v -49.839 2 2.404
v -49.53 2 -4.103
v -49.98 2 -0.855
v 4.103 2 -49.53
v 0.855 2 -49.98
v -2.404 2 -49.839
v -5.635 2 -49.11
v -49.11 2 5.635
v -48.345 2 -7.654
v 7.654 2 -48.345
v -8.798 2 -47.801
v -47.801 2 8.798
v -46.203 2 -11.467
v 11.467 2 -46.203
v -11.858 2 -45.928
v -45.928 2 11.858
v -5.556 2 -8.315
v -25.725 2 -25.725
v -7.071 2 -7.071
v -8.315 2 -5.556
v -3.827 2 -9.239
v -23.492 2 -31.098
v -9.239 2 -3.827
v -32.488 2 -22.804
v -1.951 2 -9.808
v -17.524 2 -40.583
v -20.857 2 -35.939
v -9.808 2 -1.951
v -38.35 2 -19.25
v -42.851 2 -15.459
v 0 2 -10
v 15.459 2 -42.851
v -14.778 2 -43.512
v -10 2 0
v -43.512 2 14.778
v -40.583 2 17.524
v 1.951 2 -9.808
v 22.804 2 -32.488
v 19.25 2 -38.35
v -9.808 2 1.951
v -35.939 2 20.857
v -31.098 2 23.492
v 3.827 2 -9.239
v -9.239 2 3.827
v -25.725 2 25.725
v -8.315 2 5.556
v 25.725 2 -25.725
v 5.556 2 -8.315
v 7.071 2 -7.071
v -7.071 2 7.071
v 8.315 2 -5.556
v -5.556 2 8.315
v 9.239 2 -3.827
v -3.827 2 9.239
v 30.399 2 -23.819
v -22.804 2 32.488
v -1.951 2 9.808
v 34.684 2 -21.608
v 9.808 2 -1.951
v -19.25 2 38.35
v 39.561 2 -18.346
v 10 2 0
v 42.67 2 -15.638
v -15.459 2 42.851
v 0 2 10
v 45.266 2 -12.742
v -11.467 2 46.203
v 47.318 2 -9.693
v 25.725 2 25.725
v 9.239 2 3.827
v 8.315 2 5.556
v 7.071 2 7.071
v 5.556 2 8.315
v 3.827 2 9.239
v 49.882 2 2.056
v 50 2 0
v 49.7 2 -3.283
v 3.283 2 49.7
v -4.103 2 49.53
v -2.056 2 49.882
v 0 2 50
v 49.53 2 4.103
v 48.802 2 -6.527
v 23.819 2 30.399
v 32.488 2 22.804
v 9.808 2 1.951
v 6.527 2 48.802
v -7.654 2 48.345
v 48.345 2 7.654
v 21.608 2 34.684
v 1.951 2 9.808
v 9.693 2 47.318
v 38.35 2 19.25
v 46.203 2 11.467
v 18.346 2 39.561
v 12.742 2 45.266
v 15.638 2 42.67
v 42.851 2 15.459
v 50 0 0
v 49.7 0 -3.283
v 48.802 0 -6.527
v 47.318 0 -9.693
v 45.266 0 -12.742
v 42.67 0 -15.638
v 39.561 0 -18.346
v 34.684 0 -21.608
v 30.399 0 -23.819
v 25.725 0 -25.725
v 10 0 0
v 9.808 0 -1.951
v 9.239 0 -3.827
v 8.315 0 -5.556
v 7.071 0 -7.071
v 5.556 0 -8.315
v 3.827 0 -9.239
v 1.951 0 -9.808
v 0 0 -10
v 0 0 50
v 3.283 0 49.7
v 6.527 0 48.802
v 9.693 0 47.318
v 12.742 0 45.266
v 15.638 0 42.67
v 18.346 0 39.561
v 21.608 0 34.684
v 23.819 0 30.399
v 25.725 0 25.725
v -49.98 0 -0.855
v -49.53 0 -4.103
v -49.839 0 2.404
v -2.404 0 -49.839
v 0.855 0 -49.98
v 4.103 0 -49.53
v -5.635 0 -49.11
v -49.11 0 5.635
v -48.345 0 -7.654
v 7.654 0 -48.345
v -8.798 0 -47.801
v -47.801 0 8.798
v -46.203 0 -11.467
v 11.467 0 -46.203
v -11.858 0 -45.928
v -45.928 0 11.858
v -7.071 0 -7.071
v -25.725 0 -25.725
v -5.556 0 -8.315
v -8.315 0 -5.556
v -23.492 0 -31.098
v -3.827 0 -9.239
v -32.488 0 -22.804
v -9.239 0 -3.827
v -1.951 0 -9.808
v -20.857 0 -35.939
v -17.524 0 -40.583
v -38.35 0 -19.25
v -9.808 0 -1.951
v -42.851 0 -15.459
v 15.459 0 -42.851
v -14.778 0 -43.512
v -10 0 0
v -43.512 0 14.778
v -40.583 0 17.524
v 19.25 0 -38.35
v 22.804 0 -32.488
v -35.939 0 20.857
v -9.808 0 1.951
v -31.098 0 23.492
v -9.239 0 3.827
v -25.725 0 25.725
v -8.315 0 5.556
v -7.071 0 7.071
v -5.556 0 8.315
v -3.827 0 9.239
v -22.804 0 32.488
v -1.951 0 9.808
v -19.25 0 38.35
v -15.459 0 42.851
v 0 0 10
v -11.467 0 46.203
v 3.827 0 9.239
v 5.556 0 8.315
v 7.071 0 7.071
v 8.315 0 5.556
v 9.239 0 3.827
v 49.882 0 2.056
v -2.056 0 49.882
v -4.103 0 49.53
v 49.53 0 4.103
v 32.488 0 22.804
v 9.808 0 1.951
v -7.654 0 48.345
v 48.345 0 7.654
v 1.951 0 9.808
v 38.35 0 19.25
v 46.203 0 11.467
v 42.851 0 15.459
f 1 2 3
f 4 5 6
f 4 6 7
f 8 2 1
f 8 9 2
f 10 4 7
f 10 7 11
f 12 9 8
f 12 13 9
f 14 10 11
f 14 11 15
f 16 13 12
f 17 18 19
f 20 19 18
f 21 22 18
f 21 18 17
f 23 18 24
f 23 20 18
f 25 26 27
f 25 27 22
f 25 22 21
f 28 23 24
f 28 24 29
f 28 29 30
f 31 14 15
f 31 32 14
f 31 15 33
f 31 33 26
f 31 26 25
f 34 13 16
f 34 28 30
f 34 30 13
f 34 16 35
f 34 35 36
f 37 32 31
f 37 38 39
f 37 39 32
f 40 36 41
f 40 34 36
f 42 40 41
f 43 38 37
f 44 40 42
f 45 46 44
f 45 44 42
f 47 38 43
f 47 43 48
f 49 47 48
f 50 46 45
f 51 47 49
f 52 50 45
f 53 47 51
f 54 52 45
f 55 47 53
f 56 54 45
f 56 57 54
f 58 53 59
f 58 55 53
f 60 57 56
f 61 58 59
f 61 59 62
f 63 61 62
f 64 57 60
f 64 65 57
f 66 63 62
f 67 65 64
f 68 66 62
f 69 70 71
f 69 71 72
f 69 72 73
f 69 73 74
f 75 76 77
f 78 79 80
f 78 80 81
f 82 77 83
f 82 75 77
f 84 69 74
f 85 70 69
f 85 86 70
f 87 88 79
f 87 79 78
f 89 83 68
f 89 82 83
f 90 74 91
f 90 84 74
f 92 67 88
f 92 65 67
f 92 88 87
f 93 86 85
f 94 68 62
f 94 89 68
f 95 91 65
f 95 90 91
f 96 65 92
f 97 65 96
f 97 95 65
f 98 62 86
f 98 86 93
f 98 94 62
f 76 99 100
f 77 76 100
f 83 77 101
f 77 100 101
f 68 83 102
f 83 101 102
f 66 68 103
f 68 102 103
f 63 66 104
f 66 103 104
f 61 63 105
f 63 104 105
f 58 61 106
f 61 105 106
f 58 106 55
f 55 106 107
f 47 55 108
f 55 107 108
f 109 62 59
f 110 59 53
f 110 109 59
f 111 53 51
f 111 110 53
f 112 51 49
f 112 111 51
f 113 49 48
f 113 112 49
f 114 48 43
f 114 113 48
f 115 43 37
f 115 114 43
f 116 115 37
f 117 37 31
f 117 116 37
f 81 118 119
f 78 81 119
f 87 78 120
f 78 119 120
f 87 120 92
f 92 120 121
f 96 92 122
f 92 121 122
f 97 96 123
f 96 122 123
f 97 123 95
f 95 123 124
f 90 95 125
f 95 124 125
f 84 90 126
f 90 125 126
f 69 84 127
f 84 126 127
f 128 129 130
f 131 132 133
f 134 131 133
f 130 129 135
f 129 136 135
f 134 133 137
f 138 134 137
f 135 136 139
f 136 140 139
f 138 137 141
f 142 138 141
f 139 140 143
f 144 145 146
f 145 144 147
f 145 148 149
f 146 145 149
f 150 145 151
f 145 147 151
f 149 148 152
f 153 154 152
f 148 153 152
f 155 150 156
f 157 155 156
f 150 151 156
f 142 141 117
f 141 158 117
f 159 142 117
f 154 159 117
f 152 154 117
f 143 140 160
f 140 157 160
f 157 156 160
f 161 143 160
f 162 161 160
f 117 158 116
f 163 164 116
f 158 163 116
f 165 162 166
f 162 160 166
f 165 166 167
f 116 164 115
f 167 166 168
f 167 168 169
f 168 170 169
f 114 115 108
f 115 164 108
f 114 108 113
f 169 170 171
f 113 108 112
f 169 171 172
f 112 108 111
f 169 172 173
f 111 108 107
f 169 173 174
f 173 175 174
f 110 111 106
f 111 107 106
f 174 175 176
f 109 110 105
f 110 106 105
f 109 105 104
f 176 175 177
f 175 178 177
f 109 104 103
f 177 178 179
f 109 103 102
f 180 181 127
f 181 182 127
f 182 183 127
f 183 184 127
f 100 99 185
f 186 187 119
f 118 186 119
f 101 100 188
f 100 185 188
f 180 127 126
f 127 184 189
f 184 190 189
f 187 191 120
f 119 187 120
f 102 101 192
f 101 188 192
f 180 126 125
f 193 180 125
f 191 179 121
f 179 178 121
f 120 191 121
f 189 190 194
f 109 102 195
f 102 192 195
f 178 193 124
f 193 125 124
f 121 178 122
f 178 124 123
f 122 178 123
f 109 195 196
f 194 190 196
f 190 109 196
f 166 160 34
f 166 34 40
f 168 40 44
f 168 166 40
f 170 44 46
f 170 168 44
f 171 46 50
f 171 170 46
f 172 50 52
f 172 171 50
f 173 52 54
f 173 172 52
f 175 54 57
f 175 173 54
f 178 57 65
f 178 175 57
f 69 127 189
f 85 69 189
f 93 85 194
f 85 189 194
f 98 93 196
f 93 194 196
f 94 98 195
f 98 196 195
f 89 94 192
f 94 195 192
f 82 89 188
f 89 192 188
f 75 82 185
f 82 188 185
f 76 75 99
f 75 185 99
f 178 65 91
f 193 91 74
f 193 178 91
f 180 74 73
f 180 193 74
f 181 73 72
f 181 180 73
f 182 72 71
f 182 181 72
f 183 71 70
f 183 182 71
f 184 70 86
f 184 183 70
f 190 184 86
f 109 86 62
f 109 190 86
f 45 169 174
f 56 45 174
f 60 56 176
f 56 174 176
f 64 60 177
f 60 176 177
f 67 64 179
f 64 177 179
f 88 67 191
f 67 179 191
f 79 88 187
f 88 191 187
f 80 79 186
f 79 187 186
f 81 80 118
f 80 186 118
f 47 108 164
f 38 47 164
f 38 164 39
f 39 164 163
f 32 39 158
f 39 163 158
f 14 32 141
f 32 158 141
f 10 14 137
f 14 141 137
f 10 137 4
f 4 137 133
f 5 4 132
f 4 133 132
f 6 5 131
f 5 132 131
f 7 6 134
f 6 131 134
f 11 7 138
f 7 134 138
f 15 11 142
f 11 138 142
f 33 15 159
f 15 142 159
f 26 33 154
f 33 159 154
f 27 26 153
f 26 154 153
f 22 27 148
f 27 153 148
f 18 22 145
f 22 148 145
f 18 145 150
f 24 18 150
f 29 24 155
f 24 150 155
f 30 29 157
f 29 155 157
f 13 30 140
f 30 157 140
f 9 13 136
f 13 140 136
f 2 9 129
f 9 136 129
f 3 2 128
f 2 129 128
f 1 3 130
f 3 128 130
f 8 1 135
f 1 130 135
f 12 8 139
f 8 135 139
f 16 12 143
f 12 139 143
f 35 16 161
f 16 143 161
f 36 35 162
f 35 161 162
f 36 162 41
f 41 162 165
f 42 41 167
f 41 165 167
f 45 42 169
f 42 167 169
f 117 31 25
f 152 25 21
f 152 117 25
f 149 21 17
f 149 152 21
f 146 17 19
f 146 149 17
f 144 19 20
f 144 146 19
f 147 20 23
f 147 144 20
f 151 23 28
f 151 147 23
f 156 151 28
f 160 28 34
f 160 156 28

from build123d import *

# Parameters (mm, degrees)
SZKIC1_RX                   = 50
SZKIC1_RY                   = 30
DODANIE_WYCI_GNI_CIE1_DEPTH = 2
WYTNIJ_WYCI_GNI_CIE1_REACH  = 72.739


with BuildPart() as part:
    # Szkic1 → Dodanie-wyci_gni_cie1 (new body)
    with BuildSketch(Plane(origin=(0, 0, 0), x_dir=(1, 0, 0), z_dir=(0, 1, 0))):
        with Locations(Location((0, 0), (0, 0, -90))):
            Ellipse(SZKIC1_RX, SZKIC1_RY)
        with Locations((0, 0)):
            Ellipse(SZKIC1_RX, SZKIC1_RY)
    extrude(amount=DODANIE_WYCI_GNI_CIE1_DEPTH)

    # Szkic1_4 → Wytnij-wyci_gni_cie1 (cut, up to next)
    with BuildSketch(Plane(origin=(0, 0, 0), x_dir=(1, 0, 0), z_dir=(0, 1, 0)), mode=Mode.PRIVATE) as wytnij_wyci_gni_cie1_sk1:
        with BuildLine():
            ThreePointArc((0, 10), (-7.071067818, 7.071067805), (-10, -1.8e-08))
            Line((-10, 0), (0, 0))
            Line((0, 0), (0, 10))
        make_face()
    wytnij_wyci_gni_cie1_tool1 = extrude(wytnij_wyci_gni_cie1_sk1.sketch, amount=WYTNIJ_WYCI_GNI_CIE1_REACH, mode=Mode.PRIVATE) & part.part
    # Szkic1_4 → Wytnij-wyci_gni_cie1 (cut, up to next)
    with BuildSketch(Plane(origin=(0, 0, 0), x_dir=(1, 0, 0), z_dir=(0, 1, 0)), mode=Mode.PRIVATE) as wytnij_wyci_gni_cie1_sk2:
        with BuildLine():
            Line((0, 0), (-10, 0))
            ThreePointArc((-10, -1.8e-08), (-7.071067805, -7.071067818), (0, -10))
            Line((0, -10), (0, 0))
        make_face()
    wytnij_wyci_gni_cie1_tool2 = extrude(wytnij_wyci_gni_cie1_sk2.sketch, amount=WYTNIJ_WYCI_GNI_CIE1_REACH, mode=Mode.PRIVATE) & part.part
    # Szkic1_4 → Wytnij-wyci_gni_cie1 (cut, up to next)
    with BuildSketch(Plane(origin=(0, 0, 0), x_dir=(1, 0, 0), z_dir=(0, 1, 0)), mode=Mode.PRIVATE) as wytnij_wyci_gni_cie1_sk3:
        with BuildLine():
            ThreePointArc((10, 0), (7.071067812, 7.071067812), (0, 10))
            Line((0, 10), (0, 0))
            Line((0, 0), (10, 0))
        make_face()
    wytnij_wyci_gni_cie1_tool3 = extrude(wytnij_wyci_gni_cie1_sk3.sketch, amount=WYTNIJ_WYCI_GNI_CIE1_REACH, mode=Mode.PRIVATE) & part.part
    # Szkic1_4 → Wytnij-wyci_gni_cie1 (cut, up to next)
    with BuildSketch(Plane(origin=(0, 0, 0), x_dir=(1, 0, 0), z_dir=(0, 1, 0)), mode=Mode.PRIVATE) as wytnij_wyci_gni_cie1_sk4:
        with BuildLine():
            Line((10, 0), (0, 0))
            Line((0, 0), (0, -10))
            ThreePointArc((0, -10), (7.071067812, -7.071067812), (10, 0))
        make_face()
    wytnij_wyci_gni_cie1_tool4 = extrude(wytnij_wyci_gni_cie1_sk4.sketch, amount=WYTNIJ_WYCI_GNI_CIE1_REACH, mode=Mode.PRIVATE) & part.part
    # Szkic1_4 → Wytnij-wyci_gni_cie1 (cut, up to next)
    with BuildSketch(Plane(origin=(0, 0, 0), x_dir=(1, 0, 0), z_dir=(0, 1, 0)), mode=Mode.PRIVATE) as wytnij_wyci_gni_cie1_sk5:
        with BuildLine():
            ThreePointArc((0, 10), (-7.071067818, 7.071067805), (-10, -1.8e-08))
            Line((-10, 0), (0, 0))
            Line((0, 0), (0, 10))
        make_face()
    wytnij_wyci_gni_cie1_tool5 = extrude(wytnij_wyci_gni_cie1_sk5.sketch, amount=WYTNIJ_WYCI_GNI_CIE1_REACH, mode=Mode.PRIVATE) & part.part
    # Szkic1_4 → Wytnij-wyci_gni_cie1 (cut, up to next)
    with BuildSketch(Plane(origin=(0, 0, 0), x_dir=(1, 0, 0), z_dir=(0, 1, 0)), mode=Mode.PRIVATE) as wytnij_wyci_gni_cie1_sk6:
        with BuildLine():
            Line((0, 0), (-10, 0))
            ThreePointArc((-10, -1.8e-08), (-7.071067805, -7.071067818), (0, -10))
            Line((0, -10), (0, 0))
        make_face()
    wytnij_wyci_gni_cie1_tool6 = extrude(wytnij_wyci_gni_cie1_sk6.sketch, amount=WYTNIJ_WYCI_GNI_CIE1_REACH, mode=Mode.PRIVATE) & part.part
    # Szkic1_4 → Wytnij-wyci_gni_cie1 (cut, up to next)
    with BuildSketch(Plane(origin=(0, 0, 0), x_dir=(1, 0, 0), z_dir=(0, 1, 0)), mode=Mode.PRIVATE) as wytnij_wyci_gni_cie1_sk7:
        with BuildLine():
            ThreePointArc((10, 0), (7.071067812, 7.071067812), (0, 10))
            Line((0, 10), (0, 0))
            Line((0, 0), (10, 0))
        make_face()
    wytnij_wyci_gni_cie1_tool7 = extrude(wytnij_wyci_gni_cie1_sk7.sketch, amount=WYTNIJ_WYCI_GNI_CIE1_REACH, mode=Mode.PRIVATE) & part.part
    # Szkic1_4 → Wytnij-wyci_gni_cie1 (cut, up to next)
    with BuildSketch(Plane(origin=(0, 0, 0), x_dir=(1, 0, 0), z_dir=(0, 1, 0)), mode=Mode.PRIVATE) as wytnij_wyci_gni_cie1_sk8:
        with BuildLine():
            Line((10, 0), (0, 0))
            Line((0, 0), (0, -10))
            ThreePointArc((0, -10), (7.071067812, -7.071067812), (10, 0))
        make_face()
    wytnij_wyci_gni_cie1_tool8 = extrude(wytnij_wyci_gni_cie1_sk8.sketch, amount=WYTNIJ_WYCI_GNI_CIE1_REACH, mode=Mode.PRIVATE) & part.part
    # Szkic1_4 → Wytnij-wyci_gni_cie1 (cut, up to next)
    with BuildSketch(Plane(origin=(0, 0, 0), x_dir=(1, 0, 0), z_dir=(0, 1, 0)), mode=Mode.PRIVATE) as wytnij_wyci_gni_cie1_sk9:
        with BuildLine():
            ThreePointArc((0, 10), (-7.071067818, 7.071067805), (-10, -1.8e-08))
            Line((-10, 0), (0, 0))
            Line((0, 0), (0, 10))
        make_face()
    wytnij_wyci_gni_cie1_tool9 = extrude(wytnij_wyci_gni_cie1_sk9.sketch, amount=WYTNIJ_WYCI_GNI_CIE1_REACH, mode=Mode.PRIVATE) & part.part
    # Szkic1_4 → Wytnij-wyci_gni_cie1 (cut, up to next)
    with BuildSketch(Plane(origin=(0, 0, 0), x_dir=(1, 0, 0), z_dir=(0, 1, 0)), mode=Mode.PRIVATE) as wytnij_wyci_gni_cie1_sk10:
        with BuildLine():
            Line((0, 0), (-10, 0))
            ThreePointArc((-10, -1.8e-08), (-7.071067805, -7.071067818), (0, -10))
            Line((0, -10), (0, 0))
        make_face()
    wytnij_wyci_gni_cie1_tool10 = extrude(wytnij_wyci_gni_cie1_sk10.sketch, amount=WYTNIJ_WYCI_GNI_CIE1_REACH, mode=Mode.PRIVATE) & part.part
    # Szkic1_4 → Wytnij-wyci_gni_cie1 (cut, up to next)
    with BuildSketch(Plane(origin=(0, 0, 0), x_dir=(1, 0, 0), z_dir=(0, 1, 0)), mode=Mode.PRIVATE) as wytnij_wyci_gni_cie1_sk11:
        with BuildLine():
            ThreePointArc((10, 0), (7.071067812, 7.071067812), (0, 10))
            Line((0, 10), (0, 0))
            Line((0, 0), (10, 0))
        make_face()
    wytnij_wyci_gni_cie1_tool11 = extrude(wytnij_wyci_gni_cie1_sk11.sketch, amount=WYTNIJ_WYCI_GNI_CIE1_REACH, mode=Mode.PRIVATE) & part.part
    # Szkic1_4 → Wytnij-wyci_gni_cie1 (cut, up to next)
    with BuildSketch(Plane(origin=(0, 0, 0), x_dir=(1, 0, 0), z_dir=(0, 1, 0)), mode=Mode.PRIVATE) as wytnij_wyci_gni_cie1_sk12:
        with BuildLine():
            Line((10, 0), (0, 0))
            Line((0, 0), (0, -10))
            ThreePointArc((0, -10), (7.071067812, -7.071067812), (10, 0))
        make_face()
    wytnij_wyci_gni_cie1_tool12 = extrude(wytnij_wyci_gni_cie1_sk12.sketch, amount=WYTNIJ_WYCI_GNI_CIE1_REACH, mode=Mode.PRIVATE) & part.part
    # Szkic1_4 → Wytnij-wyci_gni_cie1 (cut, up to next)
    with BuildSketch(Plane(origin=(0, 0, 0), x_dir=(1, 0, 0), z_dir=(0, 1, 0)), mode=Mode.PRIVATE) as wytnij_wyci_gni_cie1_sk13:
        with BuildLine():
            ThreePointArc((0, 10), (-7.071067818, 7.071067805), (-10, -1.8e-08))
            Line((-10, 0), (0, 0))
            Line((0, 0), (0, 10))
        make_face()
    wytnij_wyci_gni_cie1_tool13 = extrude(wytnij_wyci_gni_cie1_sk13.sketch, amount=WYTNIJ_WYCI_GNI_CIE1_REACH, mode=Mode.PRIVATE) & part.part
    # Szkic1_4 → Wytnij-wyci_gni_cie1 (cut, up to next)
    with BuildSketch(Plane(origin=(0, 0, 0), x_dir=(1, 0, 0), z_dir=(0, 1, 0)), mode=Mode.PRIVATE) as wytnij_wyci_gni_cie1_sk14:
        with BuildLine():
            Line((0, 0), (-10, 0))
            ThreePointArc((-10, -1.8e-08), (-7.071067805, -7.071067818), (0, -10))
            Line((0, -10), (0, 0))
        make_face()
    wytnij_wyci_gni_cie1_tool14 = extrude(wytnij_wyci_gni_cie1_sk14.sketch, amount=WYTNIJ_WYCI_GNI_CIE1_REACH, mode=Mode.PRIVATE) & part.part
    # Szkic1_4 → Wytnij-wyci_gni_cie1 (cut, up to next)
    with BuildSketch(Plane(origin=(0, 0, 0), x_dir=(1, 0, 0), z_dir=(0, 1, 0)), mode=Mode.PRIVATE) as wytnij_wyci_gni_cie1_sk15:
        with BuildLine():
            ThreePointArc((10, 0), (7.071067812, 7.071067812), (0, 10))
            Line((0, 10), (0, 0))
            Line((0, 0), (10, 0))
        make_face()
    wytnij_wyci_gni_cie1_tool15 = extrude(wytnij_wyci_gni_cie1_sk15.sketch, amount=WYTNIJ_WYCI_GNI_CIE1_REACH, mode=Mode.PRIVATE) & part.part
    # Szkic1_4 → Wytnij-wyci_gni_cie1 (cut, up to next)
    with BuildSketch(Plane(origin=(0, 0, 0), x_dir=(1, 0, 0), z_dir=(0, 1, 0)), mode=Mode.PRIVATE) as wytnij_wyci_gni_cie1_sk16:
        with BuildLine():
            Line((10, 0), (0, 0))
            Line((0, 0), (0, -10))
            ThreePointArc((0, -10), (7.071067812, -7.071067812), (10, 0))
        make_face()
    wytnij_wyci_gni_cie1_tool16 = extrude(wytnij_wyci_gni_cie1_sk16.sketch, amount=WYTNIJ_WYCI_GNI_CIE1_REACH, mode=Mode.PRIVATE) & part.part
    add(wytnij_wyci_gni_cie1_tool1.solids().sort_by_distance((-4.244132, 0, -4.244132))[0], mode=Mode.SUBTRACT)
    add(wytnij_wyci_gni_cie1_tool2.solids().sort_by_distance((-4.244132, 0, 4.244132))[0], mode=Mode.SUBTRACT)
    add(wytnij_wyci_gni_cie1_tool3.solids().sort_by_distance((4.244132, 0, -4.244132))[0], mode=Mode.SUBTRACT)
    add(wytnij_wyci_gni_cie1_tool4.solids().sort_by_distance((4.244132, 0, 4.244132))[0], mode=Mode.SUBTRACT)
    add(wytnij_wyci_gni_cie1_tool5.solids().sort_by_distance((-4.244132, 0, -4.244132))[0], mode=Mode.SUBTRACT)
    add(wytnij_wyci_gni_cie1_tool6.solids().sort_by_distance((-4.244132, 0, 4.244132))[0], mode=Mode.SUBTRACT)
    add(wytnij_wyci_gni_cie1_tool7.solids().sort_by_distance((4.244132, 0, -4.244132))[0], mode=Mode.SUBTRACT)
    add(wytnij_wyci_gni_cie1_tool8.solids().sort_by_distance((4.244132, 0, 4.244132))[0], mode=Mode.SUBTRACT)
    add(wytnij_wyci_gni_cie1_tool9.solids().sort_by_distance((-4.244132, 0, -4.244132))[0], mode=Mode.SUBTRACT)
    add(wytnij_wyci_gni_cie1_tool10.solids().sort_by_distance((-4.244132, 0, 4.244132))[0], mode=Mode.SUBTRACT)
    add(wytnij_wyci_gni_cie1_tool11.solids().sort_by_distance((4.244132, 0, -4.244132))[0], mode=Mode.SUBTRACT)
    add(wytnij_wyci_gni_cie1_tool12.solids().sort_by_distance((4.244132, 0, 4.244132))[0], mode=Mode.SUBTRACT)
    add(wytnij_wyci_gni_cie1_tool13.solids().sort_by_distance((-4.244132, 0, -4.244132))[0], mode=Mode.SUBTRACT)
    add(wytnij_wyci_gni_cie1_tool14.solids().sort_by_distance((-4.244132, 0, 4.244132))[0], mode=Mode.SUBTRACT)
    add(wytnij_wyci_gni_cie1_tool15.solids().sort_by_distance((4.244132, 0, -4.244132))[0], mode=Mode.SUBTRACT)
    add(wytnij_wyci_gni_cie1_tool16.solids().sort_by_distance((4.244132, 0, 4.244132))[0], mode=Mode.SUBTRACT)


solid = part.part
